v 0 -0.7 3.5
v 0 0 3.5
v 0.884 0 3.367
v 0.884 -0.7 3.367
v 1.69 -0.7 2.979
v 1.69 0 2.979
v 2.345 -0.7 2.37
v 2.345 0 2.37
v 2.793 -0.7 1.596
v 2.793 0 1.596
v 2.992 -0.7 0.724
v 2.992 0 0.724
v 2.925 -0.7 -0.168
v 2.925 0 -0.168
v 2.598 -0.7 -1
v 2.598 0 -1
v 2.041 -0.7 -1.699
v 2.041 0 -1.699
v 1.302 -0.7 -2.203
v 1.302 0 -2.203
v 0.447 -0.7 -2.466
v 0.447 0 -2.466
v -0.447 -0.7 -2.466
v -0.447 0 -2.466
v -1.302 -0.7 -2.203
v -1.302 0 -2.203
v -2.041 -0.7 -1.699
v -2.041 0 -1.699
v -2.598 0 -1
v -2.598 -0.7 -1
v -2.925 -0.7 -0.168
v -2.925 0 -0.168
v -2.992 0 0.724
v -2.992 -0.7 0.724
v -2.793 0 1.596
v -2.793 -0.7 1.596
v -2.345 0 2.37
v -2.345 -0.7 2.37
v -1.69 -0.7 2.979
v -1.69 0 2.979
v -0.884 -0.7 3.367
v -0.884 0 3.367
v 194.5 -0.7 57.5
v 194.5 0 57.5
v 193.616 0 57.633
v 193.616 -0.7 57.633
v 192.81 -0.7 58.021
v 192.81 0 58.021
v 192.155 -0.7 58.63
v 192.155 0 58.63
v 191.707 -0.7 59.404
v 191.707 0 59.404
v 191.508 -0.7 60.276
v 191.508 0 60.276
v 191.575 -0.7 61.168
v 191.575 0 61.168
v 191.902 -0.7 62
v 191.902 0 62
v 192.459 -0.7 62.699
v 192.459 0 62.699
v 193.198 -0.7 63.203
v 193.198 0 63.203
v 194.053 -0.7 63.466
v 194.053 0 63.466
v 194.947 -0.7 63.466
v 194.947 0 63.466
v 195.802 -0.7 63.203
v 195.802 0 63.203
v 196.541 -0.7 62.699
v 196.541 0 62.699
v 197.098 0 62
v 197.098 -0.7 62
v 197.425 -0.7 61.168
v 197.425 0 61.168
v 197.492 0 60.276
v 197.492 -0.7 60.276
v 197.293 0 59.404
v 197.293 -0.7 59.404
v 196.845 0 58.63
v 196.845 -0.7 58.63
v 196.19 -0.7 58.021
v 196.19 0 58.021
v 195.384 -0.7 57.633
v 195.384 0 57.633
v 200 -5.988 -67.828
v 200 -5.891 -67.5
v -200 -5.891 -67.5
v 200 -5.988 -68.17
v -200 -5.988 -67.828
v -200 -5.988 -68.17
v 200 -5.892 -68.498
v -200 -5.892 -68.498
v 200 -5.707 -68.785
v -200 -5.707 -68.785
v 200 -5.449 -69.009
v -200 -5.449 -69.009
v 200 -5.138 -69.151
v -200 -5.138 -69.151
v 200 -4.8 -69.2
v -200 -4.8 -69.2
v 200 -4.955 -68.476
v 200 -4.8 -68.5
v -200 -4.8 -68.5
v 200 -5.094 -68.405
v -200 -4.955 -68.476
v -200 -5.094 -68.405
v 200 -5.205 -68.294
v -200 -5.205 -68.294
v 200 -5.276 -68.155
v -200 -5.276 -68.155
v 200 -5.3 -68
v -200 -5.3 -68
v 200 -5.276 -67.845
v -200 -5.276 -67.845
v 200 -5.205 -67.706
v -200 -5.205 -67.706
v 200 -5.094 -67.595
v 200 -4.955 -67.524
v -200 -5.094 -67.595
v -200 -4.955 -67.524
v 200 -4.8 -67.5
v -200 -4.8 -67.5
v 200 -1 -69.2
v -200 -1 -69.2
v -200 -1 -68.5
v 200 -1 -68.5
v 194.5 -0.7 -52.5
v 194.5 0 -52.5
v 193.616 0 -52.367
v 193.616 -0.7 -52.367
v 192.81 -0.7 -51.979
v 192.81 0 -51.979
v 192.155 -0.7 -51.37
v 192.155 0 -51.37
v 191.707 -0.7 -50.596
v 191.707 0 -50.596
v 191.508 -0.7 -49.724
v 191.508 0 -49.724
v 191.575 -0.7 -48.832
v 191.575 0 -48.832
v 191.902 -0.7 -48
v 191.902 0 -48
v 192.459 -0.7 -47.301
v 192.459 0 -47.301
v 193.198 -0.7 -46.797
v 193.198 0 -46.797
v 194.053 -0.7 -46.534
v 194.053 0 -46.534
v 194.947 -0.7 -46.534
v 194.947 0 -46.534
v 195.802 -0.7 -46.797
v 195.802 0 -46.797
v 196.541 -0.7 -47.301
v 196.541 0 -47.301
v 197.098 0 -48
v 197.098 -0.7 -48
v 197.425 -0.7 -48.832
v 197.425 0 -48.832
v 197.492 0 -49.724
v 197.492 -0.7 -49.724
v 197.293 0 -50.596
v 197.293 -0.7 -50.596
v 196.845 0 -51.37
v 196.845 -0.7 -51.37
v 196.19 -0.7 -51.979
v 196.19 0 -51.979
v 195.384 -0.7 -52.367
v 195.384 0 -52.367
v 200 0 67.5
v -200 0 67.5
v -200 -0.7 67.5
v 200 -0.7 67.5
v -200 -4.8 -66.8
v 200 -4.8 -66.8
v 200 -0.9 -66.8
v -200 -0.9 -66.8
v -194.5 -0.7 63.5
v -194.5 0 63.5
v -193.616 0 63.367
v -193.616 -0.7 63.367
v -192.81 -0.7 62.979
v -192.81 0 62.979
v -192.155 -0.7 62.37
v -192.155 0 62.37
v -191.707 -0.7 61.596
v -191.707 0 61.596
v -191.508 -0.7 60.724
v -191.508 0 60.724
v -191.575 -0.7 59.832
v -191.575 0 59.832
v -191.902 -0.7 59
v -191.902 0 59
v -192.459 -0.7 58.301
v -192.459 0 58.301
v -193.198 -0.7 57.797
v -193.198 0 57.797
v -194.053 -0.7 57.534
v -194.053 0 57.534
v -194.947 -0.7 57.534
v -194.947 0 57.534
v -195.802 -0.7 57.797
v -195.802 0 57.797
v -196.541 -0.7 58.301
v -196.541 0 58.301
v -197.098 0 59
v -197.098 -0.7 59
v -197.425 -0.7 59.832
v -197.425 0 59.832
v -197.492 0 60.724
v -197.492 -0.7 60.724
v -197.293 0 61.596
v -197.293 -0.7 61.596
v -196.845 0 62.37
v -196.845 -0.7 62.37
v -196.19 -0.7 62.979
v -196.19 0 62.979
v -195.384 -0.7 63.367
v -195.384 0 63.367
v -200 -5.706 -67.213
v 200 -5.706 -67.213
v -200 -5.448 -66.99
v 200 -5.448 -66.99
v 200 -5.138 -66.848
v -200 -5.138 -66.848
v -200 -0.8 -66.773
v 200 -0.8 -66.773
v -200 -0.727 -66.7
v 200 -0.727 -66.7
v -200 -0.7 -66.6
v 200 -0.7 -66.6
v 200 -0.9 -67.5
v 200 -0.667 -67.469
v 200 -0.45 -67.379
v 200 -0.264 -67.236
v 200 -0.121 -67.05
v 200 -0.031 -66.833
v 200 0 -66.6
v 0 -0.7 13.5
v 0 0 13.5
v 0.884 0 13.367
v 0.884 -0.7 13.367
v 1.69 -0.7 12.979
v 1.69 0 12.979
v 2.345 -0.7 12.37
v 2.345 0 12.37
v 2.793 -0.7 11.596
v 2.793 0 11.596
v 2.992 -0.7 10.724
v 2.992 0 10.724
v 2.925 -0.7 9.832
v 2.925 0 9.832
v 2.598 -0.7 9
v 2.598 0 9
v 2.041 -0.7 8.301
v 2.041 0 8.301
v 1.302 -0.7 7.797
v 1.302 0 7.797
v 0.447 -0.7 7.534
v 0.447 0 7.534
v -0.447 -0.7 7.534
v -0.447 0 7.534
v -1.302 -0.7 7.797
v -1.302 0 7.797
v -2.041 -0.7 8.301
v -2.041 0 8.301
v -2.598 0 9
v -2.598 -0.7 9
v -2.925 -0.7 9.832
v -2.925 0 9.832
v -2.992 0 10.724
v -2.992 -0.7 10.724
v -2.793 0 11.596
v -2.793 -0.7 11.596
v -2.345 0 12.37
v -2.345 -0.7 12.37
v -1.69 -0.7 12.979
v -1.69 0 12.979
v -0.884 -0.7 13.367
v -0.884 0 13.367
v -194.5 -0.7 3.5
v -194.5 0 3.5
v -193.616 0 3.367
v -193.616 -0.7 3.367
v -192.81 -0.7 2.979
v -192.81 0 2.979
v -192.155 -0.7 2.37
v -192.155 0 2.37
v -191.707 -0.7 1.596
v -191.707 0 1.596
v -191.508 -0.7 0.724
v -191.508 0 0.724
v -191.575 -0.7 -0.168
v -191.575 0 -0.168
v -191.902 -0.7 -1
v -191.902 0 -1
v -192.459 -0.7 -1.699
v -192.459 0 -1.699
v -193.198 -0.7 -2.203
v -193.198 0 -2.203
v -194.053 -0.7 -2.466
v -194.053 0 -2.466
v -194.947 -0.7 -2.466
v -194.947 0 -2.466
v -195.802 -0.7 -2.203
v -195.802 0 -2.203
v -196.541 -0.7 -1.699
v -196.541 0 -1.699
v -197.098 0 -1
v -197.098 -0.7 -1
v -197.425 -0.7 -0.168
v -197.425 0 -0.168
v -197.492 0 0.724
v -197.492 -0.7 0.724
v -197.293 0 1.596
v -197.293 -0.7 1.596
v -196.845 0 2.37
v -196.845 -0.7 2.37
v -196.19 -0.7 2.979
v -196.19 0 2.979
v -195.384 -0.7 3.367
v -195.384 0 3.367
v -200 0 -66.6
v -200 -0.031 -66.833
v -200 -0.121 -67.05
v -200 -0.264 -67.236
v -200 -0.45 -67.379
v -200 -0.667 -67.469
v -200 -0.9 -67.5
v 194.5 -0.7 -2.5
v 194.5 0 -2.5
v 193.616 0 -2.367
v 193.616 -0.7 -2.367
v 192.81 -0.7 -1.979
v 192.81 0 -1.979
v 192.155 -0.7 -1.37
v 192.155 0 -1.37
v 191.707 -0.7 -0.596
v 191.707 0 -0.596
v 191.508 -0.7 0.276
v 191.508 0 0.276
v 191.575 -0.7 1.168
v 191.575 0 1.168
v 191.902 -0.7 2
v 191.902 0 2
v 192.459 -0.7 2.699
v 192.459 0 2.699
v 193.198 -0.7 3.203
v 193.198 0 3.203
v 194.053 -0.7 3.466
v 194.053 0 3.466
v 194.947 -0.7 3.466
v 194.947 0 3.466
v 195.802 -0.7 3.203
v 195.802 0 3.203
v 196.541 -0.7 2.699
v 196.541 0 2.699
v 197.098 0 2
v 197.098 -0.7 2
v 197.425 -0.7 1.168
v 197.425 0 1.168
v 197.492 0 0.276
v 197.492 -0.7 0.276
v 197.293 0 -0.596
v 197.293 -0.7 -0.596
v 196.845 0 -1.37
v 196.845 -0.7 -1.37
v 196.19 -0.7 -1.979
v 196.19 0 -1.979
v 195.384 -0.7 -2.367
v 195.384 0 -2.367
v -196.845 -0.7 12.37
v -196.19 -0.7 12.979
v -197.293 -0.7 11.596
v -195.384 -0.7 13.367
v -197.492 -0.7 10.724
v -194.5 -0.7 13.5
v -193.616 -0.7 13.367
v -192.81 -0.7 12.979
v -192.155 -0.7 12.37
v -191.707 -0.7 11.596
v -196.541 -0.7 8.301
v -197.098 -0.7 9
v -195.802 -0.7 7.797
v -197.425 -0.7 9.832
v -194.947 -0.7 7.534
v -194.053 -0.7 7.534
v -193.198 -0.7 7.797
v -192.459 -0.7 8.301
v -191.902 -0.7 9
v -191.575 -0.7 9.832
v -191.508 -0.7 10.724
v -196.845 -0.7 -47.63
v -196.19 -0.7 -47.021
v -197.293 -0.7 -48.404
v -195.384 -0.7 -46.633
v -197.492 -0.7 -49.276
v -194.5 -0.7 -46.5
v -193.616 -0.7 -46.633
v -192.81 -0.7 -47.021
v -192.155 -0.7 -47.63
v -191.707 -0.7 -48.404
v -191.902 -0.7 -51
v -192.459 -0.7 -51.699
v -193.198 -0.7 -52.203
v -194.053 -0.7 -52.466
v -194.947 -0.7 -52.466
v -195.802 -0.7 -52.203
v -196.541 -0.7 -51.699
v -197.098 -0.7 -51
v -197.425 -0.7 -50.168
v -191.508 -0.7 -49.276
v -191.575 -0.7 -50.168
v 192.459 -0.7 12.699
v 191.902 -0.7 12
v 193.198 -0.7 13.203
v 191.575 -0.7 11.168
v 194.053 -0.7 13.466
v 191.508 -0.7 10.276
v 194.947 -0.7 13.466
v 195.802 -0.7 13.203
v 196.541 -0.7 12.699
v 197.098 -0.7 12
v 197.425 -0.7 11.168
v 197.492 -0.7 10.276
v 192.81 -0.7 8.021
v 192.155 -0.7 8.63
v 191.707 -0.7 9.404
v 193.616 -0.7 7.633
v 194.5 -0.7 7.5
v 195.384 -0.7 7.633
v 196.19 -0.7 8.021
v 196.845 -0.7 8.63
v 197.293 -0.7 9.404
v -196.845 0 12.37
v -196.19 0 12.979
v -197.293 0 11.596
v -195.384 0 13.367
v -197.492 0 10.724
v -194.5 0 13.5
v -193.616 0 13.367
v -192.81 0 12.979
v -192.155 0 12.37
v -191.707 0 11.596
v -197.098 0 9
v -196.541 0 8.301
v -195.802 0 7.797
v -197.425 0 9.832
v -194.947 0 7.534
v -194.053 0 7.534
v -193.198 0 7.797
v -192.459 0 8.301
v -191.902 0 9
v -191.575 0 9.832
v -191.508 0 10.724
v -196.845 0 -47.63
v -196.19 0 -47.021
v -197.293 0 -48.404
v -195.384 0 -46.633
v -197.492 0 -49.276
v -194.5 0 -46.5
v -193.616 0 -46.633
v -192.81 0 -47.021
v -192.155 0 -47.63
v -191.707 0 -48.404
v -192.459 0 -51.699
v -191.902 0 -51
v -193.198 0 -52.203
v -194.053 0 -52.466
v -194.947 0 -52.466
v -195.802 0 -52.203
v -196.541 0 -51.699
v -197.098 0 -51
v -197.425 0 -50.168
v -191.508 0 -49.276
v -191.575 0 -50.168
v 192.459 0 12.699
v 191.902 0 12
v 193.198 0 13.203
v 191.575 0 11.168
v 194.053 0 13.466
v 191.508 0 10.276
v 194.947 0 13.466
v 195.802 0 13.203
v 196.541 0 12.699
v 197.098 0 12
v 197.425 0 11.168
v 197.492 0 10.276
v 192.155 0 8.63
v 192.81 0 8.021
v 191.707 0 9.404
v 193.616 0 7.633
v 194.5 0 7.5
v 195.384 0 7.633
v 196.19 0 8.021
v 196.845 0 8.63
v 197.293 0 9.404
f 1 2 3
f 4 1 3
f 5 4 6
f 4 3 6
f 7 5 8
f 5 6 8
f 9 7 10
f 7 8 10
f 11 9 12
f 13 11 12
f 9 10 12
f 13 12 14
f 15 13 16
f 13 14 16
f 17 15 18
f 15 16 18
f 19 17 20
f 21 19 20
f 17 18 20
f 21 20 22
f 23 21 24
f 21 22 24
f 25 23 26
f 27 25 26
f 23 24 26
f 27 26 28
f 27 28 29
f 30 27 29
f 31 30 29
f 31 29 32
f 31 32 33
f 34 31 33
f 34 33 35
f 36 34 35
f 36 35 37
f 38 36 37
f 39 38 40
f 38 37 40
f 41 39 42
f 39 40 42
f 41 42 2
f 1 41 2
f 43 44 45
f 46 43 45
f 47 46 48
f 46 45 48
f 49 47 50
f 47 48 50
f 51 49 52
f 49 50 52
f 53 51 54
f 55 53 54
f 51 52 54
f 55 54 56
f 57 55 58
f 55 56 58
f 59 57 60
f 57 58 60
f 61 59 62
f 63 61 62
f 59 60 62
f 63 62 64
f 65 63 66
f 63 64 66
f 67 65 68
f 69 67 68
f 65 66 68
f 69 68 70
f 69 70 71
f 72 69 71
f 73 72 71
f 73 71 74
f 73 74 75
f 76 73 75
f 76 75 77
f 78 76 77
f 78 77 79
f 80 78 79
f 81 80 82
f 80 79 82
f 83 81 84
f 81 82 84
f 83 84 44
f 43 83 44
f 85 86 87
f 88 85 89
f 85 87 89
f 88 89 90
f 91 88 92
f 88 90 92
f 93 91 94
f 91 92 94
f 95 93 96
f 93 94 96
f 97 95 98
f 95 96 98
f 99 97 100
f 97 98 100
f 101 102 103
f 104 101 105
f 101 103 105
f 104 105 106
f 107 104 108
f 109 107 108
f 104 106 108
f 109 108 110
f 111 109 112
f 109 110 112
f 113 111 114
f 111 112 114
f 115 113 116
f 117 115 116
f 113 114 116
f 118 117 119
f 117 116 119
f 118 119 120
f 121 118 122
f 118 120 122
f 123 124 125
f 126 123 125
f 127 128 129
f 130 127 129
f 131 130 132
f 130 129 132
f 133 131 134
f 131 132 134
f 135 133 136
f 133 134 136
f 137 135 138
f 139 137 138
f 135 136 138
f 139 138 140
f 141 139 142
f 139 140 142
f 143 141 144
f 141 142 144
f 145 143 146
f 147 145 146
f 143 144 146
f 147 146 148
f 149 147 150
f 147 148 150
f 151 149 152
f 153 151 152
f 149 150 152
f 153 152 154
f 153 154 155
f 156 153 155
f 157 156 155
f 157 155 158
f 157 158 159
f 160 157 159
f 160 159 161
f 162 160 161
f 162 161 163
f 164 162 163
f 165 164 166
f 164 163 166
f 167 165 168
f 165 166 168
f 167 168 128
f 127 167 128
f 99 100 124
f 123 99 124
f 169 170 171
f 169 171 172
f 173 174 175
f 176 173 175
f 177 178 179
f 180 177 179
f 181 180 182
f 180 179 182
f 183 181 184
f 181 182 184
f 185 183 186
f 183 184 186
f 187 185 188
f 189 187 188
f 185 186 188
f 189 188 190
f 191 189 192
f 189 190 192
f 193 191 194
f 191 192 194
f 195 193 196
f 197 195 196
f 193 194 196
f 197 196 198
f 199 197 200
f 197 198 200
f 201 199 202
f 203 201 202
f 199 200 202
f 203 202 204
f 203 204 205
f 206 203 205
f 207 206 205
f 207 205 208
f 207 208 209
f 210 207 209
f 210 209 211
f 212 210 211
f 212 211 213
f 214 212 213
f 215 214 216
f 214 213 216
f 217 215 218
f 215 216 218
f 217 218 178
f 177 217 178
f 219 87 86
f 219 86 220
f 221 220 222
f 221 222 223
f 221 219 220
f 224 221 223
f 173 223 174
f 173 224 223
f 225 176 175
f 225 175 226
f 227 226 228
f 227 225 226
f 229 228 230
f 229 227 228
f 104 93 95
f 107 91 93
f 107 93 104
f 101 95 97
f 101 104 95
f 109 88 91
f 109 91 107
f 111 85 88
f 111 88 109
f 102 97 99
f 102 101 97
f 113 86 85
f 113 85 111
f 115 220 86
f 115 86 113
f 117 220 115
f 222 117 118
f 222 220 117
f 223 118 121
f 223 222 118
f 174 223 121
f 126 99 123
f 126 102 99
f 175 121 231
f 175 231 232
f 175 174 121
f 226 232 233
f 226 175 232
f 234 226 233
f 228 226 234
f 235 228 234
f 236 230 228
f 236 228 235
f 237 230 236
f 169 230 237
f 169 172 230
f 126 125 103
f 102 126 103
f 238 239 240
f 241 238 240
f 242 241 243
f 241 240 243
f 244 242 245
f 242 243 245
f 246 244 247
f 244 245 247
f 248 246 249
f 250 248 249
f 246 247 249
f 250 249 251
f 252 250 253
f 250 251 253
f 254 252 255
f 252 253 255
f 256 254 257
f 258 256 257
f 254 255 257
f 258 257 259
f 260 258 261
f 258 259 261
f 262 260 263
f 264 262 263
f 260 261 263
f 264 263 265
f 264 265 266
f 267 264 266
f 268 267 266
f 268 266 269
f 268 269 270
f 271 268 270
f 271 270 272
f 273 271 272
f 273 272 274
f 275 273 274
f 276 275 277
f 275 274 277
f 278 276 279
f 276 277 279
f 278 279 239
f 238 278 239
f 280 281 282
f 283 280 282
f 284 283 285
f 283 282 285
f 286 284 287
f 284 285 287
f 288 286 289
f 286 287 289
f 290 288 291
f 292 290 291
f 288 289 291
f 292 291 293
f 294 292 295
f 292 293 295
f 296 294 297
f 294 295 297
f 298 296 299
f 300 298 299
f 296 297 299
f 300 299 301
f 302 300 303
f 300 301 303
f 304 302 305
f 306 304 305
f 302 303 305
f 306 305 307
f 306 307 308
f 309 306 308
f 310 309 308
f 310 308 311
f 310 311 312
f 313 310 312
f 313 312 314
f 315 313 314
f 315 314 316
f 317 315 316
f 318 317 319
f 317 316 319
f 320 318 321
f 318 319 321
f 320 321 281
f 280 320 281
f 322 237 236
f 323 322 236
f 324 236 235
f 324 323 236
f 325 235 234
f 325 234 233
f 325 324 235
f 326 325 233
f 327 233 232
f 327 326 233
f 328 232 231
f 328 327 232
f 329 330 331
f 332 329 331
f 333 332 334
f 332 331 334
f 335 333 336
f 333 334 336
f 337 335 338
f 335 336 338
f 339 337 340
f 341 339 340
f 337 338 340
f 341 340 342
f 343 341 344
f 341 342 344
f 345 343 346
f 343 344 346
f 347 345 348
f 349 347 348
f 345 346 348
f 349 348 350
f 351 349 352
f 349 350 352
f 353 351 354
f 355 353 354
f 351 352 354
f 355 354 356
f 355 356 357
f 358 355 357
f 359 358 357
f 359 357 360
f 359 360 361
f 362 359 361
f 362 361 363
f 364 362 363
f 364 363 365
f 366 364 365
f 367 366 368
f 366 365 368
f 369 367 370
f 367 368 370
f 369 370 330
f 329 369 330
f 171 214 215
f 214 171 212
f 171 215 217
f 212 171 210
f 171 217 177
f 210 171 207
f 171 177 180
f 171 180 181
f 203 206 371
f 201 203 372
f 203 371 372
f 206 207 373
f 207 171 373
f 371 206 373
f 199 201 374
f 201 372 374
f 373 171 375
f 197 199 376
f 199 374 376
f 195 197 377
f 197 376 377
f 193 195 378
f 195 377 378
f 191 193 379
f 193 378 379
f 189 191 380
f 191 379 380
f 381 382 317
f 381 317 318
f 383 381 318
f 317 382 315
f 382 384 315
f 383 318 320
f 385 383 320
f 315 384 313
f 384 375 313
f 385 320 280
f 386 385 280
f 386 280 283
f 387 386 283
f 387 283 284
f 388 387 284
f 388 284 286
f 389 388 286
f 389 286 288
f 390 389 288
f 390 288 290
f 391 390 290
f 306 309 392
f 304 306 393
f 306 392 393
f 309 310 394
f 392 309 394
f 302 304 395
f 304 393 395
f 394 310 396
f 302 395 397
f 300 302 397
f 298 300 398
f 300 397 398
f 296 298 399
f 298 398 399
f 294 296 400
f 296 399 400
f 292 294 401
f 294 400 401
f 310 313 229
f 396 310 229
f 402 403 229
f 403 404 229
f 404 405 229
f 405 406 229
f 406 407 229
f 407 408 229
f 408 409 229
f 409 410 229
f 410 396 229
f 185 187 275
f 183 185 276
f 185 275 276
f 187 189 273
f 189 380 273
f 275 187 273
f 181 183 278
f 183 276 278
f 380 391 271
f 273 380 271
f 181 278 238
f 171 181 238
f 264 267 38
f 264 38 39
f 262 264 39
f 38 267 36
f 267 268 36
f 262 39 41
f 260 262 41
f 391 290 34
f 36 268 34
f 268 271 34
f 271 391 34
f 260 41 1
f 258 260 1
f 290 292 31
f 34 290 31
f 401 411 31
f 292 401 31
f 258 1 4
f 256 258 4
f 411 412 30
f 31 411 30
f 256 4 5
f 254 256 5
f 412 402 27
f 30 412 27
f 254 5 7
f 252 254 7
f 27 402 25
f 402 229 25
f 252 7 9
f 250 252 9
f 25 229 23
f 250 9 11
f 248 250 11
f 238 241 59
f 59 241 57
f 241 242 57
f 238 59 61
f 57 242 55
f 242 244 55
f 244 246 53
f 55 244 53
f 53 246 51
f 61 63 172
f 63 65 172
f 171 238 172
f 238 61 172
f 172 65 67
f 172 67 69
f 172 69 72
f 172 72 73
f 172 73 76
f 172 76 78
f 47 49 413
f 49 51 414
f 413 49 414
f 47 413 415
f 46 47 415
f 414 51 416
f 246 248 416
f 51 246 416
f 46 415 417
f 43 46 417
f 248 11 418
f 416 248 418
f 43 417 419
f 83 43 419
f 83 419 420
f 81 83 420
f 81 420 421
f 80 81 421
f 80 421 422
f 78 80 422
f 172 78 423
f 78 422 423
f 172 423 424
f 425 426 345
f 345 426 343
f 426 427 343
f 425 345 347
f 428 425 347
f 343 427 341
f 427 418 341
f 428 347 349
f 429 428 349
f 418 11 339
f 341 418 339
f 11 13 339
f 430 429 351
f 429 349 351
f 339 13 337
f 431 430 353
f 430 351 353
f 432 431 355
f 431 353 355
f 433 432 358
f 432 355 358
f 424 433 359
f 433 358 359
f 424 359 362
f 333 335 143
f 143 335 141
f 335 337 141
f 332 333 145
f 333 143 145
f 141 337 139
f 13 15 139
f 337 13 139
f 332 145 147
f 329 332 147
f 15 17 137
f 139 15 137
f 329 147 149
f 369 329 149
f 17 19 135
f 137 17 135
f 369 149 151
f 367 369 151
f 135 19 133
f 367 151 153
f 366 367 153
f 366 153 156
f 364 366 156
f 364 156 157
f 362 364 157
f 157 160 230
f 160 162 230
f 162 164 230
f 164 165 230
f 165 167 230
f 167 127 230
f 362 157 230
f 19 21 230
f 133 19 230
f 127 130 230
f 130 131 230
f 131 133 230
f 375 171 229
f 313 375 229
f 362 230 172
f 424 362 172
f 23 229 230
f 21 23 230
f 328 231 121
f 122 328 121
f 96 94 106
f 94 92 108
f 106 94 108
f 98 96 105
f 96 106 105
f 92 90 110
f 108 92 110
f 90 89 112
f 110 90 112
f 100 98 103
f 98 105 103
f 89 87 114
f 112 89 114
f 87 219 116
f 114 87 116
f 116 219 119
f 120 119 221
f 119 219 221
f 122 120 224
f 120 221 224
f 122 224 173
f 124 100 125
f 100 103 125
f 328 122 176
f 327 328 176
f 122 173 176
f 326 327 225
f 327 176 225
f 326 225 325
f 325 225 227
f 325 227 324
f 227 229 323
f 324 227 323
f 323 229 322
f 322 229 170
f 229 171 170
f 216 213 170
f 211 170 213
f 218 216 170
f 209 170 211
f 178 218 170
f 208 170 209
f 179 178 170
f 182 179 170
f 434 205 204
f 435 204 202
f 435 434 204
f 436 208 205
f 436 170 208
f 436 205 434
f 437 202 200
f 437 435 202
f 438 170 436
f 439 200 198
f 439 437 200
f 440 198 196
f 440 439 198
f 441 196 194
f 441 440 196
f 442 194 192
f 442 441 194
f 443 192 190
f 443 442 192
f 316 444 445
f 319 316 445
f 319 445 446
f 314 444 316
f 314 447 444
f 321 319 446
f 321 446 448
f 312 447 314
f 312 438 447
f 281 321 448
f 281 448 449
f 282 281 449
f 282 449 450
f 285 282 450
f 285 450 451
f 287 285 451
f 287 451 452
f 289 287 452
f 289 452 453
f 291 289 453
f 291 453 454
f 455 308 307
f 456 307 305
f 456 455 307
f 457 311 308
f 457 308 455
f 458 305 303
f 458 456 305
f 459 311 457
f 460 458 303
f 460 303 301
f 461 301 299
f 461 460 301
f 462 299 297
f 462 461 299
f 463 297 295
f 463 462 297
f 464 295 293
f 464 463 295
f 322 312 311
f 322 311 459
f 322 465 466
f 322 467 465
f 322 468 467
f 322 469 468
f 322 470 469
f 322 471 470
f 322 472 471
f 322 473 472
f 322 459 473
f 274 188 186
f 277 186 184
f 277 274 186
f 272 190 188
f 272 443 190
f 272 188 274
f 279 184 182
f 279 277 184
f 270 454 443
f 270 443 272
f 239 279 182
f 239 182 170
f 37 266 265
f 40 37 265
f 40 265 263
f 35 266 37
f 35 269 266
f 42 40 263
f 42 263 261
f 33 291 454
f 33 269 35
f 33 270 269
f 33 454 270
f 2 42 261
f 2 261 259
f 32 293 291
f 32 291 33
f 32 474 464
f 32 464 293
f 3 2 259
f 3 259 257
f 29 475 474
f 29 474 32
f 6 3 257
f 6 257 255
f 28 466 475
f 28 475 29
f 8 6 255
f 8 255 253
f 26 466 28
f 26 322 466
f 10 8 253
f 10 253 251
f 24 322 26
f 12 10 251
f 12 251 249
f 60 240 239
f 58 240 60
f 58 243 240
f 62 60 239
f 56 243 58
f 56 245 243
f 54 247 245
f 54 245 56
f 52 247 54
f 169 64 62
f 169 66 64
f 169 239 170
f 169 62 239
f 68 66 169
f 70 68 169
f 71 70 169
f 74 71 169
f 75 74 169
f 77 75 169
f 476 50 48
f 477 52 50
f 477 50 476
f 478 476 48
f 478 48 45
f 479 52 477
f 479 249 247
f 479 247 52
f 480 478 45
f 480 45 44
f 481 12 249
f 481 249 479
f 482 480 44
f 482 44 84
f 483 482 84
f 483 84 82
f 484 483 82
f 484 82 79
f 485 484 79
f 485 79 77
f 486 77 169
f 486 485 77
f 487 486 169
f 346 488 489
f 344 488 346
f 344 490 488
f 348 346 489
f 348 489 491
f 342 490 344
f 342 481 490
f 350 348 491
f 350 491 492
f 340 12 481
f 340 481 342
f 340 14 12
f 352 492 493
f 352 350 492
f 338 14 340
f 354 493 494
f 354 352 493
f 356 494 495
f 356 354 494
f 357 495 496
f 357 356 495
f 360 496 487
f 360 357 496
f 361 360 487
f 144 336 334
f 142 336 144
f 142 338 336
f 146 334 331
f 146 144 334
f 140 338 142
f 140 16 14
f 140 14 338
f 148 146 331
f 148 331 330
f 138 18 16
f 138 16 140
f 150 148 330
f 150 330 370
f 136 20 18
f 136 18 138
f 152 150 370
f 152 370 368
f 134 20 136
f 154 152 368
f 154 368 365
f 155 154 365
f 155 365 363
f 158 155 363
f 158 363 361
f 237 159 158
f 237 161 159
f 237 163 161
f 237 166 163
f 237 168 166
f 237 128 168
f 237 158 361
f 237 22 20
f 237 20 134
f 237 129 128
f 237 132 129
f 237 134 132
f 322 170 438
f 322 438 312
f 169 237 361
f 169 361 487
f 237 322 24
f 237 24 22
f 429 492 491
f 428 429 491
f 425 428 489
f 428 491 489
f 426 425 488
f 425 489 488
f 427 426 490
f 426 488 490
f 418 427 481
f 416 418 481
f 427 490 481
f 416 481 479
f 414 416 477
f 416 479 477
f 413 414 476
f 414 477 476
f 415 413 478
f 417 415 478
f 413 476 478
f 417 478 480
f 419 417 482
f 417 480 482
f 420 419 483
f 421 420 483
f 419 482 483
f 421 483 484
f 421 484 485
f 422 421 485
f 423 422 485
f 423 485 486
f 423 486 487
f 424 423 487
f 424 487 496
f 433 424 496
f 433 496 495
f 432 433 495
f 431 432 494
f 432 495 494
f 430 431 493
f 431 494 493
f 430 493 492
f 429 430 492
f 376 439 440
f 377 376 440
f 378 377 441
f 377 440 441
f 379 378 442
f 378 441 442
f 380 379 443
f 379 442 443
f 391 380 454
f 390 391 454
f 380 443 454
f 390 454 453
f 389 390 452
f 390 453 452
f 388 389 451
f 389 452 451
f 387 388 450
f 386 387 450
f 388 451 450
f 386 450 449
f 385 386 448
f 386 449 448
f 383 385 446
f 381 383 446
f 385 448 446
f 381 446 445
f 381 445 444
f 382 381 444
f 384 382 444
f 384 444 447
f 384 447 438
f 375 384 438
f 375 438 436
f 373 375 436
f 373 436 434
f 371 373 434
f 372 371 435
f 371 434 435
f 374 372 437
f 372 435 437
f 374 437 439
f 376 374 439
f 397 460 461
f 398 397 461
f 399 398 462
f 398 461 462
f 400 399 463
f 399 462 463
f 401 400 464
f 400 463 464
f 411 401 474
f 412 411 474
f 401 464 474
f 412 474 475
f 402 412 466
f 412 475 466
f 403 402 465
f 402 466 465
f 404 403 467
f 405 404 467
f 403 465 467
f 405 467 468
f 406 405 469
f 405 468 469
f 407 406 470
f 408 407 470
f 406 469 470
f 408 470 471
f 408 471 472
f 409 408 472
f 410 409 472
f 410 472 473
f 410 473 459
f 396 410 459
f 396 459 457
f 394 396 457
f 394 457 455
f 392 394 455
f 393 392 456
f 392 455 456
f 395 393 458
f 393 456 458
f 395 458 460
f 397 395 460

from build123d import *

# Parameters (mm, degrees)
SKETCH_1_W                       = 400
SKETCH_1_H                       = 135
SKETCH_1_R                       = 3
SM_BASE_FLANGE_1_DEPTH           = 0.7
SM_EDGE_FLANGE_1_STRIP_W         = 3.2
SM_EDGE_FLANGE_1_STRIP_H         = 0.7
SM_EDGE_FLANGE_1_STRIP_CUT_DEPTH = 400
SM_EDGE_FLANGE_1_DEPTH           = 400
OTHER_START                      = -200
OTHER_1_DEPTH                    = 400
OTHER_1_2_DEPTH                  = 400


# Read off the part's stored shape, not the designer's step: 褶边1
# Sheet-metal steps are written as plain solids
with BuildPart() as part:
    # Sketch 1 → 基体-法兰1 (new body)
    with BuildSketch(Plane(origin=(0, 0, 0), x_dir=(1, 0, 0), z_dir=(0, 1, 0))):
        Rectangle(SKETCH_1_W, SKETCH_1_H)
        with Locations(Location((-194.5, -60.5, 0), (0, 0, 270))):
            Circle(SKETCH_1_R, mode=Mode.SUBTRACT)
        with Locations(Location((-194.5, -10.5, 0), (0, 0, 270))):
            Circle(SKETCH_1_R, mode=Mode.SUBTRACT)
        with Locations(Location((-194.5, -0.5, 0), (0, 0, 270))):
            Circle(SKETCH_1_R, mode=Mode.SUBTRACT)
        with Locations(Location((-194.5, 49.5, 0), (0, 0, 270))):
            Circle(SKETCH_1_R, mode=Mode.SUBTRACT)
        with Locations(Location((0, -10.5, 0), (0, 0, 270))):
            Circle(SKETCH_1_R, mode=Mode.SUBTRACT)
        with Locations(Location((0, -0.5, 0), (0, 0, 270))):
            Circle(SKETCH_1_R, mode=Mode.SUBTRACT)
        with Locations(Location((194.5, -60.5, 0), (0, 0, 90))):
            Circle(SKETCH_1_R, mode=Mode.SUBTRACT)
        with Locations(Location((194.5, -10.5, 0), (0, 0, 90))):
            Circle(SKETCH_1_R, mode=Mode.SUBTRACT)
        with Locations(Location((194.5, -0.5, 0), (0, 0, 90))):
            Circle(SKETCH_1_R, mode=Mode.SUBTRACT)
        with Locations(Location((194.5, 49.5, 0), (0, 0, 90))):
            Circle(SKETCH_1_R, mode=Mode.SUBTRACT)
    extrude(amount=-SM_BASE_FLANGE_1_DEPTH)

    # 边线-法兰1 strip (across the edge) → 边线-法兰1 strip cut (cut)
    with BuildSketch(Plane(origin=(-200, -0.7, -67.5), x_dir=(0, 0, 1), z_dir=(1, 0, 0))):
        with Locations((-0.7, -0.35)):
            Rectangle(SM_EDGE_FLANGE_1_STRIP_W, SM_EDGE_FLANGE_1_STRIP_H)
    extrude(amount=SM_EDGE_FLANGE_1_STRIP_CUT_DEPTH, mode=Mode.SUBTRACT)

    # 边线-法兰1 section (across the edge) → 边线-法兰1 (add)
    with BuildSketch(Plane(origin=(-200, -0.7, -67.5), x_dir=(0, 0, 1), z_dir=(1, 0, 0))):
        with BuildLine():
            Line((0, 0.2), (0, 5.3))
            Line((0, 5.3), (0.7, 5.3))
            Line((0.7, 5.3), (0.7, 0.2))
            ThreePointArc((0.7, 0.2), (0.758578644, 0.058578644), (0.9, 0))
            Line((0.9, 0), (0.9, -0.7))
            ThreePointArc((0.9, -0.7), (0.263603897, -0.436396103), (0, 0.2))
        make_face()
    extrude(amount=SM_EDGE_FLANGE_1_DEPTH)

    # Other 1 outline → Other 1 (cut)
    with BuildSketch(Plane.YZ.offset(OTHER_START)):
        with BuildLine():
            Line((-6, -67.5), (-5.890871211, -67.5))
            ThreePointArc((-5.890871211, -67.5), (-5.44807407, -66.990049506), (-4.8, -66.8))
            Line((-4.8, -66.8), (-6, -66.8))
            Line((-6, -66.8), (-6, -67.5))
        make_face()
    extrude(amount=OTHER_1_DEPTH, mode=Mode.SUBTRACT)

    # Other 1 2 outline → Other 1 2 (add)
    with BuildSketch(Plane.YZ.offset(OTHER_START)):
        with BuildLine():
            Line((-1, -69.2), (-1, -68.5))
            Line((-1, -68.5), (-4.8, -68.5))
            ThreePointArc((-4.8, -68.5), (-5.3, -68), (-4.8, -67.5))
            Line((-4.8, -67.5), (-5.890871211, -67.5))
            ThreePointArc((-5.890871211, -67.5), (-5.809950494, -68.64807407), (-4.8, -69.2))
            Line((-4.8, -69.2), (-1, -69.2))
        make_face()
    extrude(amount=OTHER_1_2_DEPTH)


solid = part.part
